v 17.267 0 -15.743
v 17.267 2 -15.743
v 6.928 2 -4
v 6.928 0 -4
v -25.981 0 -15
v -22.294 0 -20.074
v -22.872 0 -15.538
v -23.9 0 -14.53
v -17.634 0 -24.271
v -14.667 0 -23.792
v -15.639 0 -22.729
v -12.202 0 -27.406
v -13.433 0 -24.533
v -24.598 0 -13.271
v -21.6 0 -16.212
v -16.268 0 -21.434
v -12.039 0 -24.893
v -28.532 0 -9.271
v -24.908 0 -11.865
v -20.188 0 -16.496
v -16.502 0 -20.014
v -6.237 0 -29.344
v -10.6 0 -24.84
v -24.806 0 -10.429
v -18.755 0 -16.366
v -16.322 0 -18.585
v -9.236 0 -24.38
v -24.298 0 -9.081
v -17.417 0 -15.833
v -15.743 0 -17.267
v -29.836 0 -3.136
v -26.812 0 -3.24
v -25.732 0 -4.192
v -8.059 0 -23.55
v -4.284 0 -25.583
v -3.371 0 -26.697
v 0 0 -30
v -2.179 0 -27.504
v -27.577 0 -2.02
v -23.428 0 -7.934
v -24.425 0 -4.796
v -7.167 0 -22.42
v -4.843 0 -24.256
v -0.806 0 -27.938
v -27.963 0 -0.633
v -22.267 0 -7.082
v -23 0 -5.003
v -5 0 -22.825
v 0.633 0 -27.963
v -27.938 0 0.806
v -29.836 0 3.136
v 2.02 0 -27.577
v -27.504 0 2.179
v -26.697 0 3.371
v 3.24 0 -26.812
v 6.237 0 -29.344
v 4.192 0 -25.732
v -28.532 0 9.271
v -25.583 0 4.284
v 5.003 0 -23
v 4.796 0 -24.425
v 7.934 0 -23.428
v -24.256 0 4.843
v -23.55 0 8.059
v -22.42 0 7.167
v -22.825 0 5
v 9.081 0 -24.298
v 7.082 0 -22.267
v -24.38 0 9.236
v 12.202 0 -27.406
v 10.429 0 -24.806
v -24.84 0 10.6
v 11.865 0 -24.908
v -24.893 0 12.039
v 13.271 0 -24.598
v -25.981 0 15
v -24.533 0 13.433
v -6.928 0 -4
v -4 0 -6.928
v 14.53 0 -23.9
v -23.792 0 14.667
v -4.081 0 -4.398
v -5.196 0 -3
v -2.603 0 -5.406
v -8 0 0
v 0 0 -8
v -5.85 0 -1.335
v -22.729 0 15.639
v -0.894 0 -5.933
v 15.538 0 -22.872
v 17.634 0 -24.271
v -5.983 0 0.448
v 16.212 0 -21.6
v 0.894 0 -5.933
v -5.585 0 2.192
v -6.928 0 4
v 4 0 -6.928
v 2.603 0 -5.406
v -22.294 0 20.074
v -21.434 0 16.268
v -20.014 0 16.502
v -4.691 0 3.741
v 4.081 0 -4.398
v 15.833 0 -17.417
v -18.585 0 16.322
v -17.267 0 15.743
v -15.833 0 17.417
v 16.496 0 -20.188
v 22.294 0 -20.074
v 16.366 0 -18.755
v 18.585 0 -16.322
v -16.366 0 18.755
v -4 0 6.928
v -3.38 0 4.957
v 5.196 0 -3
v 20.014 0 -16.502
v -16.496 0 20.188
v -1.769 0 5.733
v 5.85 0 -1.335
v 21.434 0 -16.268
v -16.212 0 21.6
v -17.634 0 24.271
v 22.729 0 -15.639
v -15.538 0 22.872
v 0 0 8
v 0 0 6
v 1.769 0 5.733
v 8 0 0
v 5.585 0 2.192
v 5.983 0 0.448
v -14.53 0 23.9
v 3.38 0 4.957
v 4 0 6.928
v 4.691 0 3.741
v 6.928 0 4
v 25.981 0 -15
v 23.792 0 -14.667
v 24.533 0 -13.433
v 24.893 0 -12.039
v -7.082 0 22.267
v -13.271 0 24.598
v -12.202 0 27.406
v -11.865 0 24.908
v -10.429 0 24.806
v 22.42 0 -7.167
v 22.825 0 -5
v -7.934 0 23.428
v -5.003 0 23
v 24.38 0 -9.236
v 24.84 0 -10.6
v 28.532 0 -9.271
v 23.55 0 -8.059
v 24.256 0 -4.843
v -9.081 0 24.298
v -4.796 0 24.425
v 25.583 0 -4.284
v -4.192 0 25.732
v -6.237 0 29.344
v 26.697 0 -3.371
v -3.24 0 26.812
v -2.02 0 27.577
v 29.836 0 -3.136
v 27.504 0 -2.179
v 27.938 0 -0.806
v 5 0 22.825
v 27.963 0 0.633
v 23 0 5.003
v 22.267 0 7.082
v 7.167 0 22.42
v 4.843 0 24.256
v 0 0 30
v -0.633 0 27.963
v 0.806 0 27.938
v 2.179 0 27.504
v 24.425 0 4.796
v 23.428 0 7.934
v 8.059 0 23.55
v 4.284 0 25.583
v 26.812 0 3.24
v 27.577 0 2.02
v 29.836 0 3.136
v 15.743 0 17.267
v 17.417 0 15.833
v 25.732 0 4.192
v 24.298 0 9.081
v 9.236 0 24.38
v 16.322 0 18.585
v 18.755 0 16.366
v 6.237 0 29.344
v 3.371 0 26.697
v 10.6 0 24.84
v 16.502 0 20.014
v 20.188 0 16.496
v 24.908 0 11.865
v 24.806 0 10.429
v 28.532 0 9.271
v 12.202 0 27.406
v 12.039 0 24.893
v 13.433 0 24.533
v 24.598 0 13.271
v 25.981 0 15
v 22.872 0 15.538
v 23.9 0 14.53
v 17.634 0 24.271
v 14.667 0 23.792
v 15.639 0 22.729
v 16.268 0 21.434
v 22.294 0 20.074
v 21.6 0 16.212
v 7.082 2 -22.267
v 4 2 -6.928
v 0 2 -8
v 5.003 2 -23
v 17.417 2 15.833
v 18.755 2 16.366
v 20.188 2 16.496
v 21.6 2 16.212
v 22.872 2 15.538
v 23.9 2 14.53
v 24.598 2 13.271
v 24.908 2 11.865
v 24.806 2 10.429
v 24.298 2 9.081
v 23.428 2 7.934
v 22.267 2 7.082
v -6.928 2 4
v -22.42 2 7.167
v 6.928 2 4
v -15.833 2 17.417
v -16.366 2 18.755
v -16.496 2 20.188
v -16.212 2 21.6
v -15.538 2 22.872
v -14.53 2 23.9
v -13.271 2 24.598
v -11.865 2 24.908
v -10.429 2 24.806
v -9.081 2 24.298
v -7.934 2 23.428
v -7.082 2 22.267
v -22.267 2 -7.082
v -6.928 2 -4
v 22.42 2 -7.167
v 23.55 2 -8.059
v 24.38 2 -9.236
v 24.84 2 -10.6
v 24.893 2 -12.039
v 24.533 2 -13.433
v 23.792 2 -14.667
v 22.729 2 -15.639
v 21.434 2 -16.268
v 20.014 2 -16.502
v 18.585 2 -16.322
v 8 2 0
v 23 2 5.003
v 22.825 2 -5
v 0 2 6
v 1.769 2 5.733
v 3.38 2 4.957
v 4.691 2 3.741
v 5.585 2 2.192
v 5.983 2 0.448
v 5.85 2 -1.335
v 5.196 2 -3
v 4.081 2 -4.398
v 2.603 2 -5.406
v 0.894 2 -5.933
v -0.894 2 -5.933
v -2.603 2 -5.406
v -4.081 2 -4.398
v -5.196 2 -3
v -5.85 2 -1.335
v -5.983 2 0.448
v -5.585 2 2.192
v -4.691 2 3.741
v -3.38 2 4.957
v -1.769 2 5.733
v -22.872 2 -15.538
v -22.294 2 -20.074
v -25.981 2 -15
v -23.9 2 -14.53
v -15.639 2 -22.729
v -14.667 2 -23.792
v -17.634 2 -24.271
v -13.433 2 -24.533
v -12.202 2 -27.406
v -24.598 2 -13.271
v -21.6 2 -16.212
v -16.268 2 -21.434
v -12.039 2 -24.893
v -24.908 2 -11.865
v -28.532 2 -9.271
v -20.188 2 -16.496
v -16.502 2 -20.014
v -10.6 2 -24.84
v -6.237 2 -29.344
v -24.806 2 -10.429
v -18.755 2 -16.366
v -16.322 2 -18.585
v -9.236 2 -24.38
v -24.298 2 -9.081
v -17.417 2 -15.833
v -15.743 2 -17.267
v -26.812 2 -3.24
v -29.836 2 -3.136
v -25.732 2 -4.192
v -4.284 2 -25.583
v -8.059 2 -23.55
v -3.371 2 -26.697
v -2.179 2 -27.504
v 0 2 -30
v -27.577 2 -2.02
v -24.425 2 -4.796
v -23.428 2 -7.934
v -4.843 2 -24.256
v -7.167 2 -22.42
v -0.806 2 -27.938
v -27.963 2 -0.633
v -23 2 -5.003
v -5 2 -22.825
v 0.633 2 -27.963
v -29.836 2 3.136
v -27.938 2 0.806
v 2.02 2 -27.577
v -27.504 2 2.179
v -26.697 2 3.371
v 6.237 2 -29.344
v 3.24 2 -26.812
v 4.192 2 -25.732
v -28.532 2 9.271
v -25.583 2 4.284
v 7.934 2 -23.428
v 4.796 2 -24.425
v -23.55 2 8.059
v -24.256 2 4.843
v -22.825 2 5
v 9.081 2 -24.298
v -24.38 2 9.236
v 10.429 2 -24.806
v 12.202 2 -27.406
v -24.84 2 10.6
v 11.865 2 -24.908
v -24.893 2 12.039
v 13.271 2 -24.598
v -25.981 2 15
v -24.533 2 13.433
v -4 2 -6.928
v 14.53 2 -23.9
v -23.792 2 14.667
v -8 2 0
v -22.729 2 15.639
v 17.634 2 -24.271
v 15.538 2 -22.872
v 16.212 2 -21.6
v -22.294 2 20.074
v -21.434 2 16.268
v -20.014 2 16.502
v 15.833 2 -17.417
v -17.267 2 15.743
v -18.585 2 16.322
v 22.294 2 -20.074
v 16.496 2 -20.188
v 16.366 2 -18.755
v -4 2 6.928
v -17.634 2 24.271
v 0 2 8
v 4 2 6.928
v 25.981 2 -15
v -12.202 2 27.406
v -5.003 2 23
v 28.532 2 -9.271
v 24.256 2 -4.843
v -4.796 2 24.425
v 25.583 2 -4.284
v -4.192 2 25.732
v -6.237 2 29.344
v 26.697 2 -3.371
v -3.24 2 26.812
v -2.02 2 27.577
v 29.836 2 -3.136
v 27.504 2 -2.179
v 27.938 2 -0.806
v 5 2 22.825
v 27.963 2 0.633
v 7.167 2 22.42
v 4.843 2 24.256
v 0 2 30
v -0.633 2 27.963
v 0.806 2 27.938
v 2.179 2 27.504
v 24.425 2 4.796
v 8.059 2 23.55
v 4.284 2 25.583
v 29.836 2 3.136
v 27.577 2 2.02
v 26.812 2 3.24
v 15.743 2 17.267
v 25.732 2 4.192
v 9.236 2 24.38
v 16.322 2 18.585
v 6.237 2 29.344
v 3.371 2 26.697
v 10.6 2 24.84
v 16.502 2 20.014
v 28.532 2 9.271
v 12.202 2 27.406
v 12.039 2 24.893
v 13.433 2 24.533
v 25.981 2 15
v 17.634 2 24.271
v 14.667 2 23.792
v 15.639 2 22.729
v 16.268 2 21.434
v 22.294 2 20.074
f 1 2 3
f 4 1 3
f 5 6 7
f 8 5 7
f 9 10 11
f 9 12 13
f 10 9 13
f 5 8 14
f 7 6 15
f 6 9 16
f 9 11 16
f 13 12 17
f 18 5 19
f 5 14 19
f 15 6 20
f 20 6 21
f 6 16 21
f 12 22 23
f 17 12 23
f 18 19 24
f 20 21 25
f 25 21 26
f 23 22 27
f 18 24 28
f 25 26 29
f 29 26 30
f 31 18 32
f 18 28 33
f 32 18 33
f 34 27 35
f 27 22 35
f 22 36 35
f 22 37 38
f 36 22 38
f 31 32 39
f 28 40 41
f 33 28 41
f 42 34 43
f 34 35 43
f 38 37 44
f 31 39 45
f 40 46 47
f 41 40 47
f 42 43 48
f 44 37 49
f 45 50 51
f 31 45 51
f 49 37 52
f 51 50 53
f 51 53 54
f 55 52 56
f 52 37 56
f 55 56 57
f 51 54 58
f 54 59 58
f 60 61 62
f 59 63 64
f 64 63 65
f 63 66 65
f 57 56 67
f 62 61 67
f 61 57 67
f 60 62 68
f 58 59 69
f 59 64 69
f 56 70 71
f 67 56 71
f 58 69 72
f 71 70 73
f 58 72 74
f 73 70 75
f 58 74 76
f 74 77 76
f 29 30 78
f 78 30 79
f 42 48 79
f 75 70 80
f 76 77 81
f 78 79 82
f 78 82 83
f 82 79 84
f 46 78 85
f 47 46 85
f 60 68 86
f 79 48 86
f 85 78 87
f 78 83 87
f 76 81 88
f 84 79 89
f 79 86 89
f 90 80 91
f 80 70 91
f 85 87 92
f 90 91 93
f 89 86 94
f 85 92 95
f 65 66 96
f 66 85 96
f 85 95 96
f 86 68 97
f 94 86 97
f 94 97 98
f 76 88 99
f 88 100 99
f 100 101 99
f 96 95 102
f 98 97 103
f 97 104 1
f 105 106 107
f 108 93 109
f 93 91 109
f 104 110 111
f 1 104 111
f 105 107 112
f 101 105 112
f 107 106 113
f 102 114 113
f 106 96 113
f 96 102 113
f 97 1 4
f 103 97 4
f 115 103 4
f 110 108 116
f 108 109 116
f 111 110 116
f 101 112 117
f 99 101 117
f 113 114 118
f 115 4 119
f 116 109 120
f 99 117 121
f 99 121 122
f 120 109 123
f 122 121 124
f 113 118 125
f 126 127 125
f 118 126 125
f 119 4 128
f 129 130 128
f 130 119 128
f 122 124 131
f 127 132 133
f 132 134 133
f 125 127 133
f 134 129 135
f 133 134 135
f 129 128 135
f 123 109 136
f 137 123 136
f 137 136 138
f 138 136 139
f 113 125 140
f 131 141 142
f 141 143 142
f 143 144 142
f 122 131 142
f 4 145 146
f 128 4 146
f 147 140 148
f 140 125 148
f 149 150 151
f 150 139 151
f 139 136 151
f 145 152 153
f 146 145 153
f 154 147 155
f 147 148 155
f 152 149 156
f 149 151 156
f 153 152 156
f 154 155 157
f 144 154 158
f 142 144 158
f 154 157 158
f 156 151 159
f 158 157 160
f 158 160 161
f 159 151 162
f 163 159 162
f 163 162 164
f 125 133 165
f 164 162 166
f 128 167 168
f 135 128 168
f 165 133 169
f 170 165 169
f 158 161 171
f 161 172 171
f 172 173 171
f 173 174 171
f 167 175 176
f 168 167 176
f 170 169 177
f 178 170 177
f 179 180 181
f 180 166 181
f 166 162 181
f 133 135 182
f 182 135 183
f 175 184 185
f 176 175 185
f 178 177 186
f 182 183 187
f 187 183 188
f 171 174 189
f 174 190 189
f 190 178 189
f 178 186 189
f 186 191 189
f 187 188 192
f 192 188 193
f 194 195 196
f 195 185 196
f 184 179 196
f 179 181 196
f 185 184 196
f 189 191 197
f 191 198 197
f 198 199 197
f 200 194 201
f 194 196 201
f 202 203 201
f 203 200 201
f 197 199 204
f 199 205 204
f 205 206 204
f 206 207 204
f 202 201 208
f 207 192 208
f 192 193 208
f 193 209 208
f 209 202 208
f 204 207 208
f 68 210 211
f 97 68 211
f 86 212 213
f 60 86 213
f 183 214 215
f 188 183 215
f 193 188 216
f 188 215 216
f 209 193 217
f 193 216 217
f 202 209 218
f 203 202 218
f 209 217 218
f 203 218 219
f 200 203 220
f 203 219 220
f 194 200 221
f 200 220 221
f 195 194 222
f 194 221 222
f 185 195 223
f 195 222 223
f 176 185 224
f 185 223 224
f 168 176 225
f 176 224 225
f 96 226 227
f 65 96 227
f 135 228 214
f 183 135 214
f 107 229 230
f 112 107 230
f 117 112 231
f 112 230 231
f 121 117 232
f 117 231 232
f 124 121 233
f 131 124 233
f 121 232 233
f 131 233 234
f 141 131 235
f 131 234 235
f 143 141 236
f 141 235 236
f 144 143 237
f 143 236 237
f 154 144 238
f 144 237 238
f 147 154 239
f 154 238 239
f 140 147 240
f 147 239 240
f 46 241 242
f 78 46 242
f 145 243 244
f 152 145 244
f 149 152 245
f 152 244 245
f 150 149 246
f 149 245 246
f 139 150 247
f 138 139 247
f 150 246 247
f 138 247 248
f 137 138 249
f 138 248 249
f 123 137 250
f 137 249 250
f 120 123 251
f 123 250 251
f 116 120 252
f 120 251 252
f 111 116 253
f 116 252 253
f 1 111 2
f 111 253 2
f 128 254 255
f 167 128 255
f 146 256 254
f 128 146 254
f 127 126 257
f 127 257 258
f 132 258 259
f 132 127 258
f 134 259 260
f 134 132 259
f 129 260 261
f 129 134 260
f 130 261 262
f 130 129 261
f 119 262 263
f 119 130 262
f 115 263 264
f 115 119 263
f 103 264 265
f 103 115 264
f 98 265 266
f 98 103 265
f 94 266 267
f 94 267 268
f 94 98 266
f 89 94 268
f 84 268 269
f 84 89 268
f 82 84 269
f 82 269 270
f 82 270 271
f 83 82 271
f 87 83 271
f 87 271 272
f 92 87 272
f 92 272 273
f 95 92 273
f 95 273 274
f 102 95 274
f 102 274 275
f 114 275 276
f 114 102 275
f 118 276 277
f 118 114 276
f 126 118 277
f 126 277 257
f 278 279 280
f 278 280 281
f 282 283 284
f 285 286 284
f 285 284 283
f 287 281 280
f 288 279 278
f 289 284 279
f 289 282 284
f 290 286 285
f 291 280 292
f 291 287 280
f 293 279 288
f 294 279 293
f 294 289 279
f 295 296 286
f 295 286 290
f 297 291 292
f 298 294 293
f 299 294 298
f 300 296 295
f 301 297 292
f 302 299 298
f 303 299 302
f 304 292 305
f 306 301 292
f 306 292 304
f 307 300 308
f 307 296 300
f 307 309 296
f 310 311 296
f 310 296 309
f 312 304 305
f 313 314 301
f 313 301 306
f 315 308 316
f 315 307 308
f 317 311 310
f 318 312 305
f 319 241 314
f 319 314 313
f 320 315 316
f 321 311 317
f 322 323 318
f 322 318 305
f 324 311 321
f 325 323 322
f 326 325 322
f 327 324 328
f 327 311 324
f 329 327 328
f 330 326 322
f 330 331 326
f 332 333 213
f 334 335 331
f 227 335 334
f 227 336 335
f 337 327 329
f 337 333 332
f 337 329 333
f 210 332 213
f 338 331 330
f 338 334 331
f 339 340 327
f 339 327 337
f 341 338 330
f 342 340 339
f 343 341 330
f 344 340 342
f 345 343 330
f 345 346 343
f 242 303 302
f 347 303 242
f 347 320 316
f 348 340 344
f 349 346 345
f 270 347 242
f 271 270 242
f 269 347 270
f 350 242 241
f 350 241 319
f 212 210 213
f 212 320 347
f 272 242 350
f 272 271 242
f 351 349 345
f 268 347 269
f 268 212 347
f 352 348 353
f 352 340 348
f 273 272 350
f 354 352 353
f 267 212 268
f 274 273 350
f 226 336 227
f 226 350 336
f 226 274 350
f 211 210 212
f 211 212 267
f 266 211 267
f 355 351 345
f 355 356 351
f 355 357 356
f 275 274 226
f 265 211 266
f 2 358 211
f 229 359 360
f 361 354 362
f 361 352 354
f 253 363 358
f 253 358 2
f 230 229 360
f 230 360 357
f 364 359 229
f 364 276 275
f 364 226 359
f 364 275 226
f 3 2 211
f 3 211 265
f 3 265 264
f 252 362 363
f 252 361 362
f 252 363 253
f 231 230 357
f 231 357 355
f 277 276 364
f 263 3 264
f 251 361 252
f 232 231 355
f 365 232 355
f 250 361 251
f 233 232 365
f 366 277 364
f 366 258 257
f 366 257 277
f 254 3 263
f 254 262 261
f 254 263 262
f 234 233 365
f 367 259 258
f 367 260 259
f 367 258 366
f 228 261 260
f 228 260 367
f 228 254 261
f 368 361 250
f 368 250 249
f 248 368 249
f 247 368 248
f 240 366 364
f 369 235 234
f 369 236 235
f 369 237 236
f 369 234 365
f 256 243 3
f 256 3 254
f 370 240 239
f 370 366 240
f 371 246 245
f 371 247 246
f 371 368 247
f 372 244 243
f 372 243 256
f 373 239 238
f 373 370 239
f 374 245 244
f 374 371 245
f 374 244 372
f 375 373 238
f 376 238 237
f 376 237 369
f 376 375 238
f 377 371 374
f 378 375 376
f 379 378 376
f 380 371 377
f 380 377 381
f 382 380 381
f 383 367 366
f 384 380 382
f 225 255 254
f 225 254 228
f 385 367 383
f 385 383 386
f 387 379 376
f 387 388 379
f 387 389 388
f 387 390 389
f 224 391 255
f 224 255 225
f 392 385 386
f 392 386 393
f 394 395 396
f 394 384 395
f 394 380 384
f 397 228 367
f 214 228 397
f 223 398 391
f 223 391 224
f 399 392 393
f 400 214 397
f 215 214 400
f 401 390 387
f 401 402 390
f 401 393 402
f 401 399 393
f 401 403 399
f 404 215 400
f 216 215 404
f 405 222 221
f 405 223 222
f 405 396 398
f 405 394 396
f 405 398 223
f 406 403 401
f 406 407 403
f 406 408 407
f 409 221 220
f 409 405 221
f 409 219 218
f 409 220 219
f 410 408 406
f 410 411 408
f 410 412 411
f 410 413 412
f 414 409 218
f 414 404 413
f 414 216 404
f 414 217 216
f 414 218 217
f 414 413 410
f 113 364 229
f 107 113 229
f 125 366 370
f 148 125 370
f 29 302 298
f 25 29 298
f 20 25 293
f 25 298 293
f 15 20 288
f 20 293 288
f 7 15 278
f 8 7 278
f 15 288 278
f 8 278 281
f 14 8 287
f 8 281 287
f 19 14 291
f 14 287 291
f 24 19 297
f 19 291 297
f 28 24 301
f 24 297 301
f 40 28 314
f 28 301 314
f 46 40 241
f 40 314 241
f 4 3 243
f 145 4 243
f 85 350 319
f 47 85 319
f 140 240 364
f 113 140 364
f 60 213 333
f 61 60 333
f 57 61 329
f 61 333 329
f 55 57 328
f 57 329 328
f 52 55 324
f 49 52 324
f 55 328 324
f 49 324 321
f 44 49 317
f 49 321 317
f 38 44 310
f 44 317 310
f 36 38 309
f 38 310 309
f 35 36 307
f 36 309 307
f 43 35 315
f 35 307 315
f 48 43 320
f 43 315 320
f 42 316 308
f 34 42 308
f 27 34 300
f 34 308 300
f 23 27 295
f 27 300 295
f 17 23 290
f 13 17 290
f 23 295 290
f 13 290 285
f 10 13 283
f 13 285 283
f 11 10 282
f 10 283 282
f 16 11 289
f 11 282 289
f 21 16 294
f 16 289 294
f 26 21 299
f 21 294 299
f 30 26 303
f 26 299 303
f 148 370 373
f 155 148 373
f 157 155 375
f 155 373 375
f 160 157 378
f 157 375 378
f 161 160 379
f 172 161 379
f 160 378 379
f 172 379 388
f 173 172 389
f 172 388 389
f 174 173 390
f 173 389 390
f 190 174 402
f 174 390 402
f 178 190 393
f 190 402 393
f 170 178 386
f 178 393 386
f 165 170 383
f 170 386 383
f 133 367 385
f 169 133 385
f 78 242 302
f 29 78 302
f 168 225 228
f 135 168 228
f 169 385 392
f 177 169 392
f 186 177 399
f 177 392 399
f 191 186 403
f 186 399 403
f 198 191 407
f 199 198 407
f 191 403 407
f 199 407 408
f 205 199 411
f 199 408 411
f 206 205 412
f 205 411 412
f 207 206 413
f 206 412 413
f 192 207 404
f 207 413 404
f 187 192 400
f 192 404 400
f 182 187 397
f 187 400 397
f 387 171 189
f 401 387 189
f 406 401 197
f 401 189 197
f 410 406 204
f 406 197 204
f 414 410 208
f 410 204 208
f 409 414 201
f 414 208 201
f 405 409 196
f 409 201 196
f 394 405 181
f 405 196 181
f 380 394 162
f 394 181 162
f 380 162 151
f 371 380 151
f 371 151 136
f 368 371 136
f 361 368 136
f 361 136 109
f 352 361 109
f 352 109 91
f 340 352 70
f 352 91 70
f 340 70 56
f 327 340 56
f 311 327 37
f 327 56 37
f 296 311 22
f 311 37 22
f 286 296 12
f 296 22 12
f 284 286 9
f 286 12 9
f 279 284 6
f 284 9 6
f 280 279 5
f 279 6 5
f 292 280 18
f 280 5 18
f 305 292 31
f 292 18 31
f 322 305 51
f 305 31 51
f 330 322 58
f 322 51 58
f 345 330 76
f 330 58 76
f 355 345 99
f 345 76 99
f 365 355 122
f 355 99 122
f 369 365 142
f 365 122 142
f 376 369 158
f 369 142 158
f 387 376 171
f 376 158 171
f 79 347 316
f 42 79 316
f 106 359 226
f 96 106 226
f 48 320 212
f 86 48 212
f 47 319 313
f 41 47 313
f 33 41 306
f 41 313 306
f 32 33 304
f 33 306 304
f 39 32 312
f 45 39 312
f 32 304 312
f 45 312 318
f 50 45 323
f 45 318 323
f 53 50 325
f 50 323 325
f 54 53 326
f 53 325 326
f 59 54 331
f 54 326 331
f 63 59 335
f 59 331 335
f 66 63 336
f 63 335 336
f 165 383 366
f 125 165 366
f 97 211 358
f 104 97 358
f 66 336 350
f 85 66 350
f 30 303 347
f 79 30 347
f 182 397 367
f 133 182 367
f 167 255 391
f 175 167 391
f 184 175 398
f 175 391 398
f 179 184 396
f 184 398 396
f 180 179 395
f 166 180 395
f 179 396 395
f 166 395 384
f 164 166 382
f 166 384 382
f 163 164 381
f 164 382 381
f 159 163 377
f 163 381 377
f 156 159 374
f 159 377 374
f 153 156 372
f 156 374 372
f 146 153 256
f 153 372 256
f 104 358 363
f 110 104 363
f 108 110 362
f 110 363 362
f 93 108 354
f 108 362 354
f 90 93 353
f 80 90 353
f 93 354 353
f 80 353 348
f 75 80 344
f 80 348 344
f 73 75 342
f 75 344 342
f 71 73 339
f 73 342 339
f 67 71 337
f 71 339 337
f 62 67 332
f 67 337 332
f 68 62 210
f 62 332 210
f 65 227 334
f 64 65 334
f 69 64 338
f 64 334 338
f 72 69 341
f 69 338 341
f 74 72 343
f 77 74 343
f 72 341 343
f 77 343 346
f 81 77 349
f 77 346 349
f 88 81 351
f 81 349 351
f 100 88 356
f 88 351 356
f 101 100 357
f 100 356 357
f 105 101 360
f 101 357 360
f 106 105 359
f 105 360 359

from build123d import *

# Parameters (mm, degrees)
SKETCH1_R         = 30
SKETCH1_R_2       = 6
EXTRUDE1_DEPTH    = 2
EXTRUDE2_DEPTH    = 2
CIRPATTERN1_COUNT = 12


with BuildPart() as part:
    # Sketch1 → Extrude1 (new body)
    with BuildSketch(Plane(origin=(0, 0, 0), x_dir=(1, 0, 0), z_dir=(0, 1, 0))):
        with Locations(Location((0, 0, 0), (0, 0, 270))):
            Circle(SKETCH1_R)
        with Locations(Location((0, 0, 0), (0, 0, 270))):
            Circle(SKETCH1_R_2, mode=Mode.SUBTRACT)
    extrude(amount=EXTRUDE1_DEPTH)

    # Sketch2 → Extrude2 (cut)
    with BuildSketch(Plane(origin=(0, 2, 0), x_dir=(1, 0, 0), z_dir=(0, 1, 0))):
        with BuildLine():
            Line((-5, 22.825230384), (0, 8))
            Line((0, 8), (5.003053509, 23))
            ThreePointArc((5.003053509, 23), (-0.087398144, 28.002290074), (-5, 22.825230384))
        make_face()
    extrude2 = extrude(amount=-EXTRUDE2_DEPTH, mode=Mode.SUBTRACT)

    # CirPattern1: Extrude2 ×12 about axis
    cirpattern1_axis = Axis((0, 0, 0), (0, 1, 0))
    for i in range(1, CIRPATTERN1_COUNT):
        add(extrude2.rotate(cirpattern1_axis, i * 360 / CIRPATTERN1_COUNT), mode=Mode.SUBTRACT)


solid = part.part
